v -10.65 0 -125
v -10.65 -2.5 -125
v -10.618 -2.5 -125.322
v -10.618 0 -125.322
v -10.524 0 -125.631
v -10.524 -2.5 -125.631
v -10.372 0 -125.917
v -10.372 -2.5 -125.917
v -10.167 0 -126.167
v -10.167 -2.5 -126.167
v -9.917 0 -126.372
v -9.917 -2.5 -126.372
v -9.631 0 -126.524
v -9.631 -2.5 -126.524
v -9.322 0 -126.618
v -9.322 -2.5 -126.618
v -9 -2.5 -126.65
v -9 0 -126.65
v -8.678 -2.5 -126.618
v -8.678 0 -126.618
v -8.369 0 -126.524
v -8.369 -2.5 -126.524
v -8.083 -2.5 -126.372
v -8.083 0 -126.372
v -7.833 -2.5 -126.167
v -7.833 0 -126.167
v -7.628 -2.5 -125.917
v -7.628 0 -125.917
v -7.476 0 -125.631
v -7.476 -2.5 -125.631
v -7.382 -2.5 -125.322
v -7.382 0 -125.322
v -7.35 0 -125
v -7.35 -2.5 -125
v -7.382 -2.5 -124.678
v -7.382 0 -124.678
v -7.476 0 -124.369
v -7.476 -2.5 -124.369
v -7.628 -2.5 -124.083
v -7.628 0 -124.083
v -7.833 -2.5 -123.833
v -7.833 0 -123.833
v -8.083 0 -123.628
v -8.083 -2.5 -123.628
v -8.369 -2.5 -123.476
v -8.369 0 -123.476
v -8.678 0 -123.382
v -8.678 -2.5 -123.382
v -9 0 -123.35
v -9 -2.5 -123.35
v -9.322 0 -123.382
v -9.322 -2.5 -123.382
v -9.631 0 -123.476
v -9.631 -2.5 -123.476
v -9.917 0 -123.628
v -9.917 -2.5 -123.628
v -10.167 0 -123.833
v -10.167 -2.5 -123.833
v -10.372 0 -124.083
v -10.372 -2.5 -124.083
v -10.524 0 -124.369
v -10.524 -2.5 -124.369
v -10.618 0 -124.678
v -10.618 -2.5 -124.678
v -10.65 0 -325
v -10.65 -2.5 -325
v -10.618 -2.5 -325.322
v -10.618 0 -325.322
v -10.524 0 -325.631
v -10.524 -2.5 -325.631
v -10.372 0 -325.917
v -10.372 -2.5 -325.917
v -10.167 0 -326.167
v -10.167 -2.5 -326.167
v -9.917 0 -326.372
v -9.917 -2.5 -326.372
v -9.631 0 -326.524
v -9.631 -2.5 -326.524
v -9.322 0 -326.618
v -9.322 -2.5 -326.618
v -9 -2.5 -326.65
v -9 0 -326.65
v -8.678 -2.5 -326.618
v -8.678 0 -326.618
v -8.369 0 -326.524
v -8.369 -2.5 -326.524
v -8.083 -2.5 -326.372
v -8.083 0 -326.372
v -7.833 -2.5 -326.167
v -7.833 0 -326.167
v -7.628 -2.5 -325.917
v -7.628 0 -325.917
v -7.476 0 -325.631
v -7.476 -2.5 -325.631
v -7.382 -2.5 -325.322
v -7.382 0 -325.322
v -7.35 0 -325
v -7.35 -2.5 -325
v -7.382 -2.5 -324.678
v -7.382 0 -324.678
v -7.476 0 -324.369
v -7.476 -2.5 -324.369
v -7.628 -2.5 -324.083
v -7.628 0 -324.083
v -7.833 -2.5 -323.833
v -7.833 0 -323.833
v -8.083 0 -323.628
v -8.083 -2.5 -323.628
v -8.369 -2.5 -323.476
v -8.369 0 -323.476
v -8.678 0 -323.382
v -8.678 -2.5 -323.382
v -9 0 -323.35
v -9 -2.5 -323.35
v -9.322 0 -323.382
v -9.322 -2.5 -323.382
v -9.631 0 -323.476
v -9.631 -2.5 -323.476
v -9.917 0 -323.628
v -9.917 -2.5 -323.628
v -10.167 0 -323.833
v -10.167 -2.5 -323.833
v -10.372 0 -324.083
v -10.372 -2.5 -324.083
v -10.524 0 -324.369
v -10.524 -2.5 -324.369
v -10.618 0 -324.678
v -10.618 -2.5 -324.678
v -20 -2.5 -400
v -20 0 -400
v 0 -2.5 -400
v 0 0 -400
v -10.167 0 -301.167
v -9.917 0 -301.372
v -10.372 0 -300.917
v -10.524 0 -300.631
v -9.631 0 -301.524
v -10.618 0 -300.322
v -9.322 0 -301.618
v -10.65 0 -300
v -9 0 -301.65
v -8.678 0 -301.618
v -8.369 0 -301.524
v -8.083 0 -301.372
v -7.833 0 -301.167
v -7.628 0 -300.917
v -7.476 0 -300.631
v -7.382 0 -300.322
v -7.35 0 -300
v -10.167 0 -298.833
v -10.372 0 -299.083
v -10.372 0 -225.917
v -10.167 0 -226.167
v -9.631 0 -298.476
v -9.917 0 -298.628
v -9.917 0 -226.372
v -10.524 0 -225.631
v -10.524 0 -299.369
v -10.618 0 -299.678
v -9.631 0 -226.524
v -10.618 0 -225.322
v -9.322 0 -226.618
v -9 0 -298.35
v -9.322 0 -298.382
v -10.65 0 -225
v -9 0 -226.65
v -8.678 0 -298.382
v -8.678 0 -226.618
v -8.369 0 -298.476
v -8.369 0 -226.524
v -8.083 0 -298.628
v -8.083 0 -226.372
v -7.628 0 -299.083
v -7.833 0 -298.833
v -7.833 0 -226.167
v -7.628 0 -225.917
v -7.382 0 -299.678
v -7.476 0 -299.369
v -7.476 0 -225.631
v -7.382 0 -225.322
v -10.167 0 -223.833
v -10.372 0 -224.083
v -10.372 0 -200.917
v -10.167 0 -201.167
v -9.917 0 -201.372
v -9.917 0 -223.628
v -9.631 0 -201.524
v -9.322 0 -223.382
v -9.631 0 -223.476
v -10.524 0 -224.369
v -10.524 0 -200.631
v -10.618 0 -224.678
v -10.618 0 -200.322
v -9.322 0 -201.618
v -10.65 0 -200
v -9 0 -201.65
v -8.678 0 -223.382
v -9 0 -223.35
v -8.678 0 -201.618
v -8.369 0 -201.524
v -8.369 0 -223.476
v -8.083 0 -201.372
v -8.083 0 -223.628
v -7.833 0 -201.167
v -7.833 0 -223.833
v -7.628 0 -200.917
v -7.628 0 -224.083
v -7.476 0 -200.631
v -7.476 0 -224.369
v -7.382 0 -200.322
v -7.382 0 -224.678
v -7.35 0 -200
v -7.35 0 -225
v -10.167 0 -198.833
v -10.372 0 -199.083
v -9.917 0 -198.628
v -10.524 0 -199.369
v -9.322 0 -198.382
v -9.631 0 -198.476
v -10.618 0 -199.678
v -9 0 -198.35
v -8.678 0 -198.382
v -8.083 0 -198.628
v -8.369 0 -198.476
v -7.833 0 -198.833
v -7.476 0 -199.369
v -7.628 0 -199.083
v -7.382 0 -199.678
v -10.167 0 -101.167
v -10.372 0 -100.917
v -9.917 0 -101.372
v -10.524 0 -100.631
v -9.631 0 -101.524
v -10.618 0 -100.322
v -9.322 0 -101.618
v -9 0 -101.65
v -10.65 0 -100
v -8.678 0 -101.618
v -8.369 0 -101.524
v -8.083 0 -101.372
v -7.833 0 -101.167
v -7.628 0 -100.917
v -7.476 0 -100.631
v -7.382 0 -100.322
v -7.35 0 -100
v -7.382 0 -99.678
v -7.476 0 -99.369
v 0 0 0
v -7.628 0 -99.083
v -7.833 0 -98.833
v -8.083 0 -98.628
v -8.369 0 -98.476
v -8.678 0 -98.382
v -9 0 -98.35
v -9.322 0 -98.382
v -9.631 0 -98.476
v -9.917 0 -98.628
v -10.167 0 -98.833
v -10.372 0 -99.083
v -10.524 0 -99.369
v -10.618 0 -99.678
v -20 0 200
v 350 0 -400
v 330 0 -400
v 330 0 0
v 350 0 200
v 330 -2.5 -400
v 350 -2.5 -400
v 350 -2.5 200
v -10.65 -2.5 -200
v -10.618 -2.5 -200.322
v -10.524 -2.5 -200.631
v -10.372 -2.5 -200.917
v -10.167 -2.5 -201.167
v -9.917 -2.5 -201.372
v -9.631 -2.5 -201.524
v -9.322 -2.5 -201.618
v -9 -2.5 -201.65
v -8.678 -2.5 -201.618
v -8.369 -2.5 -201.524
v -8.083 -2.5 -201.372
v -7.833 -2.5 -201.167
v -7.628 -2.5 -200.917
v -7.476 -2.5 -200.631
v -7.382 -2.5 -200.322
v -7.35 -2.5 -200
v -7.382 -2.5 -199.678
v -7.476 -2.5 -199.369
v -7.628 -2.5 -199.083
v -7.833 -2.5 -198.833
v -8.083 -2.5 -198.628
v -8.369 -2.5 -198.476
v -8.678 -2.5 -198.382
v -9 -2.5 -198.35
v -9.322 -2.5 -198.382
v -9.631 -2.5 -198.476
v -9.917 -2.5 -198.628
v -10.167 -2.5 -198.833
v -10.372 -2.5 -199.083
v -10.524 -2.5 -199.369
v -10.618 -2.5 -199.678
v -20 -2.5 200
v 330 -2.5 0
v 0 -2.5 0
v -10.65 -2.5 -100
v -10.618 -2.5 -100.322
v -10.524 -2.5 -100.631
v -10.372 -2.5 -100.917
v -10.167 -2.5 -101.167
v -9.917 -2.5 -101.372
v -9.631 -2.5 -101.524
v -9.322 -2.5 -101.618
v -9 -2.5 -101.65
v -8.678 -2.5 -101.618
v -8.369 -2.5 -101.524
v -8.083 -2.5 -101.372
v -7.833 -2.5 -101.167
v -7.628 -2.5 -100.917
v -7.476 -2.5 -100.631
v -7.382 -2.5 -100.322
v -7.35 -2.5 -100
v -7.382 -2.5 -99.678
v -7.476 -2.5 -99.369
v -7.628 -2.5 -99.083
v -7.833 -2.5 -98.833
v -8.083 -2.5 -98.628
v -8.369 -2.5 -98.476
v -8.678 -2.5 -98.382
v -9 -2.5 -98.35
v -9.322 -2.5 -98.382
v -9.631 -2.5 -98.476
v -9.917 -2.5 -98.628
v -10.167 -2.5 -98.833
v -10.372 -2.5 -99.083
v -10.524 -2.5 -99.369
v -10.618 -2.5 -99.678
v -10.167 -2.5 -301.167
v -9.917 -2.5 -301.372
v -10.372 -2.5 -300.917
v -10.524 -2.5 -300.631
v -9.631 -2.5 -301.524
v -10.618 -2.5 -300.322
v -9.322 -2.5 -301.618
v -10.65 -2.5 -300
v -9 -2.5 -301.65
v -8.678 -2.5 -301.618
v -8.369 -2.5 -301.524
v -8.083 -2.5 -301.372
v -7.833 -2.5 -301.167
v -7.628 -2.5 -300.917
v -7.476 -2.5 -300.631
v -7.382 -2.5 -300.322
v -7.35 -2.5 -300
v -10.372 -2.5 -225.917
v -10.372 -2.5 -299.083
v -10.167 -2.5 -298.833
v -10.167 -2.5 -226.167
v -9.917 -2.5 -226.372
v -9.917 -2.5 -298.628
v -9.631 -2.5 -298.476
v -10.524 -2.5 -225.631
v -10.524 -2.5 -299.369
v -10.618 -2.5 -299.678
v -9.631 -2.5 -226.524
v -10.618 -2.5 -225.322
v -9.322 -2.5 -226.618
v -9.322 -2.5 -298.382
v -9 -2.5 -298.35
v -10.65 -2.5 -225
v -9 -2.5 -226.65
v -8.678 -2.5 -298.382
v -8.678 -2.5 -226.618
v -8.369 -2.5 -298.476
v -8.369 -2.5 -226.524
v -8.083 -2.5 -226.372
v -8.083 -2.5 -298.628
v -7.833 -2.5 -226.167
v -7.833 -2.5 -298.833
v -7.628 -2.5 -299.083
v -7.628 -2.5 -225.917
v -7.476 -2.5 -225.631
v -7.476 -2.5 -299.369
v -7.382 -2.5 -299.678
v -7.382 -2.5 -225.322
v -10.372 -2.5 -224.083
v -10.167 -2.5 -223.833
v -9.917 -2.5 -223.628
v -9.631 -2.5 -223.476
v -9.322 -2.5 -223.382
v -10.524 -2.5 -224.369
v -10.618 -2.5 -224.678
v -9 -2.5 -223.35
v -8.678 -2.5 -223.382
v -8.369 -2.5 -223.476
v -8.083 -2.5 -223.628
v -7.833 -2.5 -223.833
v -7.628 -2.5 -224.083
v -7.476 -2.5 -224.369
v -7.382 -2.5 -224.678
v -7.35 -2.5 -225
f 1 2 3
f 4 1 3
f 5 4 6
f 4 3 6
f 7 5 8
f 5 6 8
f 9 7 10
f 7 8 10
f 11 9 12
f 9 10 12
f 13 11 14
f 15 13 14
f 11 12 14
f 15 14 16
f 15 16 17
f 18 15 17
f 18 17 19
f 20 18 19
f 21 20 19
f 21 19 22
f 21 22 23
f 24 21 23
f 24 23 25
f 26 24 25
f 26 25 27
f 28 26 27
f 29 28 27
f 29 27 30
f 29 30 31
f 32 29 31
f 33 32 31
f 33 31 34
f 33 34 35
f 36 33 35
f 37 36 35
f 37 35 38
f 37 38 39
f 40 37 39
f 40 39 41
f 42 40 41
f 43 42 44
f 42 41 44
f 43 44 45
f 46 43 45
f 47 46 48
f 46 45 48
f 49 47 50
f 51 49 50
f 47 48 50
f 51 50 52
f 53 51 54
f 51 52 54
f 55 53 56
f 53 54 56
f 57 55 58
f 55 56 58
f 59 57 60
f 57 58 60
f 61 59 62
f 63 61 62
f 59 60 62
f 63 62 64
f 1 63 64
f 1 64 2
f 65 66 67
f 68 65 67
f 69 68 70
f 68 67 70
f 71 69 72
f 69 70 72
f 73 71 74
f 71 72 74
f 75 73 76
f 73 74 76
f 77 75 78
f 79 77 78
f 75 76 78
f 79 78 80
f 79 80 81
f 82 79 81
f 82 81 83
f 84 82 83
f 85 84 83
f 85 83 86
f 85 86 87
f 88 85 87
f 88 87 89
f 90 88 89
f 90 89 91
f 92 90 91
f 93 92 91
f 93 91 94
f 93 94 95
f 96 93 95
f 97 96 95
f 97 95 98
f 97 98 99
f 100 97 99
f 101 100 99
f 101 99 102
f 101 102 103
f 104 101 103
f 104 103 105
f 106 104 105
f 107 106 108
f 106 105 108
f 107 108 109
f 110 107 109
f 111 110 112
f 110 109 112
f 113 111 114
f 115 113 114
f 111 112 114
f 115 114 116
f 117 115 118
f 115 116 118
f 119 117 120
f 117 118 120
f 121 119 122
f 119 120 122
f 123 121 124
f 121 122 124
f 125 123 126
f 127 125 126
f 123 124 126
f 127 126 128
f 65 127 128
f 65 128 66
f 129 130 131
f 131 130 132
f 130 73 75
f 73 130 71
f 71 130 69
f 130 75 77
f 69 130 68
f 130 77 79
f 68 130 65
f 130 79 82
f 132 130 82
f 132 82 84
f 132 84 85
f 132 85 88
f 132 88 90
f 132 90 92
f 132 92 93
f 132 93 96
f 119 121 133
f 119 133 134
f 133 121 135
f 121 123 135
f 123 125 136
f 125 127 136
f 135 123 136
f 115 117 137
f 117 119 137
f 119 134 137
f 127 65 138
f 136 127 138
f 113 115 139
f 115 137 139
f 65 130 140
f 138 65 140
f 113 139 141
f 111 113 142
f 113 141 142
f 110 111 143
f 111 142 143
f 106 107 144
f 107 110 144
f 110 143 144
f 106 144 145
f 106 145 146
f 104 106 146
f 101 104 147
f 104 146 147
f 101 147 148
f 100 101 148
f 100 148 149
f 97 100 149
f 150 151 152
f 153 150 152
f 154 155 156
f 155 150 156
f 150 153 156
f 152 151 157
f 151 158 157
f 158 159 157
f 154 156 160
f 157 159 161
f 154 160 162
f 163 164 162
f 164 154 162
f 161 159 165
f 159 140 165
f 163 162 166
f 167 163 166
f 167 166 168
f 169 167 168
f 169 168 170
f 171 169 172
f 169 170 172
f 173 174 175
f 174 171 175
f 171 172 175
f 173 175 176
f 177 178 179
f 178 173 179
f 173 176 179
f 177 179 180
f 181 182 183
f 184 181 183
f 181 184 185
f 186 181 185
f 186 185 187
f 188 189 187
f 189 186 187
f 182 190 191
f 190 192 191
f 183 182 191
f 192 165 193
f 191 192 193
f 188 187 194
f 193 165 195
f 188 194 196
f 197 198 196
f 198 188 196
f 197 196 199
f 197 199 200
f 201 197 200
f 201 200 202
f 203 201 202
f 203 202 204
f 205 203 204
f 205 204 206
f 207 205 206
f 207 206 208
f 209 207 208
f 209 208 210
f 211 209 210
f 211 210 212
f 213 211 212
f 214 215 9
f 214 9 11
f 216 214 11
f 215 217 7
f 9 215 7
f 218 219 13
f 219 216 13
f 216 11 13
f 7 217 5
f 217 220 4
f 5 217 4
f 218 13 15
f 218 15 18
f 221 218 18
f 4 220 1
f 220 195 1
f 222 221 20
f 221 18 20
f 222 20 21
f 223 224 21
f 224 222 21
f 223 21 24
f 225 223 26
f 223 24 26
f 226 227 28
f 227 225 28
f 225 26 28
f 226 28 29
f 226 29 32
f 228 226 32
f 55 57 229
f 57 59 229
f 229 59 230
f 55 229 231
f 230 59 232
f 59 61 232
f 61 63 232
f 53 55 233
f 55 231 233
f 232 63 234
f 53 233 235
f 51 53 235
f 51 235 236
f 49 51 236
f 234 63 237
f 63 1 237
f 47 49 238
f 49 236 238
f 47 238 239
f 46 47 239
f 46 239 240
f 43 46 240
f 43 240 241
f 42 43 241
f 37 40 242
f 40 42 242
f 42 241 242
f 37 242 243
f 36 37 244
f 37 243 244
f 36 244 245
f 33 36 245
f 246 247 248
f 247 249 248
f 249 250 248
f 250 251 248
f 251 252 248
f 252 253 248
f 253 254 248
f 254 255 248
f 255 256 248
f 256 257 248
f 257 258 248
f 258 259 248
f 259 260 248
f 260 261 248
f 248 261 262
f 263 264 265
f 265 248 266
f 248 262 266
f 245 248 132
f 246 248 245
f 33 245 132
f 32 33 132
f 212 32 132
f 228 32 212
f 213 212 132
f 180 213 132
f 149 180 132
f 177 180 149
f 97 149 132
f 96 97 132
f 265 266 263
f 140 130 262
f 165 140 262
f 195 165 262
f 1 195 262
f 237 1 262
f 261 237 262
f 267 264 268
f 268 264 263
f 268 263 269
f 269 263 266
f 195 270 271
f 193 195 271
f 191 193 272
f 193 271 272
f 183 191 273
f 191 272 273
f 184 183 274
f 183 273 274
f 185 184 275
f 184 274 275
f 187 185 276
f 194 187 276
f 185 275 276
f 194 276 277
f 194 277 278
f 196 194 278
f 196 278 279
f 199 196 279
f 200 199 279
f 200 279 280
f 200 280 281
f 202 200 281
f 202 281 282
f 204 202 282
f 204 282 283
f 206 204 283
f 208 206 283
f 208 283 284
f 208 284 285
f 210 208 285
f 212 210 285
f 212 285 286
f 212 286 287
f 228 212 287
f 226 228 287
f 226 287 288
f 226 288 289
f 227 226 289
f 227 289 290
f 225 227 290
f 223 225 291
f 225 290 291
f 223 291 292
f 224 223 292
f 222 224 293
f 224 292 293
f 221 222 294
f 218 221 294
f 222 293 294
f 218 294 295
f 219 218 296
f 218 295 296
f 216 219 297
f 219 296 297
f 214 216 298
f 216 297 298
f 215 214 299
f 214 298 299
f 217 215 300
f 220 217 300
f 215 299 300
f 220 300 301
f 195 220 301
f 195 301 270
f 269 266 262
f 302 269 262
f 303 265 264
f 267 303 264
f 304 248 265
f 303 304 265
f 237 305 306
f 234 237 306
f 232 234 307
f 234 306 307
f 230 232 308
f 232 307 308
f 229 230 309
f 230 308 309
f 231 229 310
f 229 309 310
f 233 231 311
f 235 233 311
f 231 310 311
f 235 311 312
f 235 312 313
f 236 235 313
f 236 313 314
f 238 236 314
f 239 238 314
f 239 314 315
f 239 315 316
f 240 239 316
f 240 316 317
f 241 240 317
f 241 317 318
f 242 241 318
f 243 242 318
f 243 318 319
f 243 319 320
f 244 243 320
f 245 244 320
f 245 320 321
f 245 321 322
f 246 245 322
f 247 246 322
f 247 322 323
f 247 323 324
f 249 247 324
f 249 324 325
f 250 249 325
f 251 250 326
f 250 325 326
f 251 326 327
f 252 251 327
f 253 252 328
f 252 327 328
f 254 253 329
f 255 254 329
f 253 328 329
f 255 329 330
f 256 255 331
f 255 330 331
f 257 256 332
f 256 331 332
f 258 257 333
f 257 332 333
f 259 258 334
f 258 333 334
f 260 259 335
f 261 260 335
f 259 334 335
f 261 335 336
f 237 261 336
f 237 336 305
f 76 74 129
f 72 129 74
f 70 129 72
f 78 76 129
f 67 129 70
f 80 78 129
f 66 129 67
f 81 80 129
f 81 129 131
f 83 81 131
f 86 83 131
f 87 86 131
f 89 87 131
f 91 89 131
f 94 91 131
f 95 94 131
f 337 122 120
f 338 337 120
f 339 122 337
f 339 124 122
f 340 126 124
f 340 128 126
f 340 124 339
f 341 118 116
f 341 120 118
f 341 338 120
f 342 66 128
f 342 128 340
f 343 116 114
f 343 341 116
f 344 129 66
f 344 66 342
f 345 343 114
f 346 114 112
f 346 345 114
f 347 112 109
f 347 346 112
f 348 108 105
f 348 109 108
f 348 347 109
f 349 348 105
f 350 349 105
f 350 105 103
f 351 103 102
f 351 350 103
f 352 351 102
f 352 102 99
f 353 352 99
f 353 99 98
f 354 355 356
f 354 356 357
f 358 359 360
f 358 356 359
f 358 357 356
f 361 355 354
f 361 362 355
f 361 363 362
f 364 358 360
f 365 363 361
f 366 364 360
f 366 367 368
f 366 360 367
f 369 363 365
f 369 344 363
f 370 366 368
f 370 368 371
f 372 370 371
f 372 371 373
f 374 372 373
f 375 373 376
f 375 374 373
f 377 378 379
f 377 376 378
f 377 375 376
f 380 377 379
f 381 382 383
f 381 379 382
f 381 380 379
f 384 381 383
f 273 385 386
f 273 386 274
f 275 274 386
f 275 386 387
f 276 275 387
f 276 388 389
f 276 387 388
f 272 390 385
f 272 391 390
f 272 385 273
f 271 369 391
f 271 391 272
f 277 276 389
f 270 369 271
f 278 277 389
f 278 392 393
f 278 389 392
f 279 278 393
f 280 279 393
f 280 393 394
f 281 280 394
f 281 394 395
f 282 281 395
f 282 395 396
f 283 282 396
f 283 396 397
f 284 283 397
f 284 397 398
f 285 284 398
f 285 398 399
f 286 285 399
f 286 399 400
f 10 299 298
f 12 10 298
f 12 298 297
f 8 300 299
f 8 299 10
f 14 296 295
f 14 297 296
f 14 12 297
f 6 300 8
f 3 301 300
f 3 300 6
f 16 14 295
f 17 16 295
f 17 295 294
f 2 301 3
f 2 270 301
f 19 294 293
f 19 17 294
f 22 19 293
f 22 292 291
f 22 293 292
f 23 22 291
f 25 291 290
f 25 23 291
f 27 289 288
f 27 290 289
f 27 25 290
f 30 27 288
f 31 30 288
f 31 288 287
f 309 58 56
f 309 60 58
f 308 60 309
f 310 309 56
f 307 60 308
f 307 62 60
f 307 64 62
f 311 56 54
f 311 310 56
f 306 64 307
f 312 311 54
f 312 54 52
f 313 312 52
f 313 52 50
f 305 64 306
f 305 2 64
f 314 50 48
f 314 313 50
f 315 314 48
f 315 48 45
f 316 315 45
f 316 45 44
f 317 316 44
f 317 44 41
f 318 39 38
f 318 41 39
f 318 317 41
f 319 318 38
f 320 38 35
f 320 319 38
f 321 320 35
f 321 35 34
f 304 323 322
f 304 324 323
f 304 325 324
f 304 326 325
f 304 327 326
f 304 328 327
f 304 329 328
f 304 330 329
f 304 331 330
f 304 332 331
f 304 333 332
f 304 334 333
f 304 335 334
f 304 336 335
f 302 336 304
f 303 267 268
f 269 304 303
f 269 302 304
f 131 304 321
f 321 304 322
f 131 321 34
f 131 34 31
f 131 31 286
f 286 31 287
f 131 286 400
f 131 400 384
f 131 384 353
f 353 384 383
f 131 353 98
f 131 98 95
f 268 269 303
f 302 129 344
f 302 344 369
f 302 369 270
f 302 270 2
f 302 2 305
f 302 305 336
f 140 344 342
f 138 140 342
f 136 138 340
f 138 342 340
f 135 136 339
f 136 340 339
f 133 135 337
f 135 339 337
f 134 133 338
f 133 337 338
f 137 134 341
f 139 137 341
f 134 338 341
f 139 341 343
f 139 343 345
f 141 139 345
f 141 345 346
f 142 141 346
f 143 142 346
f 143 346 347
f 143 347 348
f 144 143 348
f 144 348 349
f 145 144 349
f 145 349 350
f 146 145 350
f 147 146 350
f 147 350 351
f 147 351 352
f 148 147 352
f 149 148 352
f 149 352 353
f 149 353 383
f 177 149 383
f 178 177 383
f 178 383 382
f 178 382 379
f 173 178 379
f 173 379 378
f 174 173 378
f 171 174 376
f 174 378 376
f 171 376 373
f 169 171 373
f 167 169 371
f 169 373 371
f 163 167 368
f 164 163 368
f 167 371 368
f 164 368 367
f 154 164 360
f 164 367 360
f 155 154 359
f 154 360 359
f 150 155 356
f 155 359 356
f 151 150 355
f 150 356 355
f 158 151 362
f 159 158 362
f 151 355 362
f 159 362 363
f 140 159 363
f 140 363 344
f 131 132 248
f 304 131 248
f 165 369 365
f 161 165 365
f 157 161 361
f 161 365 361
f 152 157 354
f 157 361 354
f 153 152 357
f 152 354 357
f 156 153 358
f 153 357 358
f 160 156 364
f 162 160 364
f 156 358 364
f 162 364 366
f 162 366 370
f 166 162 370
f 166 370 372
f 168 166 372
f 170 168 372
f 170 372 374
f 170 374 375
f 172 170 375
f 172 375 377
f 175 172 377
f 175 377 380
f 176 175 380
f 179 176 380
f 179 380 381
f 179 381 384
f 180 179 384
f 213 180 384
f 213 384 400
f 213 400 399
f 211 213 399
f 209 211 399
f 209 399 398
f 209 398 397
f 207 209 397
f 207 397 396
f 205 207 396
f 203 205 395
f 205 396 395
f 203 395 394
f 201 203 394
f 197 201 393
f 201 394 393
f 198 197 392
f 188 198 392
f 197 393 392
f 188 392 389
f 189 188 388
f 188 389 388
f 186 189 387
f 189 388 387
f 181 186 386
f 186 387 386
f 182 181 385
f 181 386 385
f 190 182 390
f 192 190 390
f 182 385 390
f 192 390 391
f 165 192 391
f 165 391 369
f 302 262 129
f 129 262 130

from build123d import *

# Parameters (mm, degrees)
F1_DEPTH = 2.5
F2_D     = 3.3
F2_DEPTH = 40
F2_TIP   = 0.9914200214


with BuildPart() as f1:
    # F0 (on Front) → F1 (new body)
    with BuildSketch(Plane.XZ):
        Polygon((0, -400), (0, 0), (330, 0), (330, -400), (350, -400), (350, 200), (-20, 200), (-20, -400), align=None)
    extrude(amount=F1_DEPTH)

    # F2
    with Locations(Plane(origin=(0, 0, 0), x_dir=(1, 0, 0), z_dir=(0, 1, 0))):
        with Locations((-9, 100), (-9, 200), (-9, 300), (-9, 125), (-9, 225), (-9, 325)):
            Hole(F2_D / 2, depth=F2_DEPTH)
            with Locations((0, 0, -(F2_DEPTH + F2_TIP / 2))):  # 118° drill point
                Cone(0, F2_D / 2, F2_TIP, mode=Mode.SUBTRACT)


solid = f1.part
